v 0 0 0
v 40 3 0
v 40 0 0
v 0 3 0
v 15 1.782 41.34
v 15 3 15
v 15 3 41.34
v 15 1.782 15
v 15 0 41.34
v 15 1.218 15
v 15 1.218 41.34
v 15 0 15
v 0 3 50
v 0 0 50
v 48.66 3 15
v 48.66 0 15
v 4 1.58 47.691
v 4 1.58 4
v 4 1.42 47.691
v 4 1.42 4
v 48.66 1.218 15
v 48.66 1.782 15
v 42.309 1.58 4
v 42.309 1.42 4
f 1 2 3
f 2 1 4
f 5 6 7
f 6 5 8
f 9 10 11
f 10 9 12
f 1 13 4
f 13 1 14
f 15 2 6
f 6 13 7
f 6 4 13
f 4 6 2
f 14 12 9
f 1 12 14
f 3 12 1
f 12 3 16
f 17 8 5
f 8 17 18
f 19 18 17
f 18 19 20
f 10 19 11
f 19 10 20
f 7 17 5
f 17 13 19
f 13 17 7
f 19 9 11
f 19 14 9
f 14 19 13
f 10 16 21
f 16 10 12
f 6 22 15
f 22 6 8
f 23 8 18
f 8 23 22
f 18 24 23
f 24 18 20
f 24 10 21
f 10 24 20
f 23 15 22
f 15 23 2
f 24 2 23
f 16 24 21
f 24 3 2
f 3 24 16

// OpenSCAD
lenght = 50;

translate([0,0,lenght])rotate([0,90,0]) side(false);
side();


module side(left_corner = true){
    difference(){
        cube([lenght,3,15]);
        #
        translate([-5,3/2,16])
        rotate([-90,0,-90])
        linear_extrude(lenght+10)
        polygon([[-0.3,0],[0.3,0],[0.08,12],[-0.08,12]]);
        
        
        
        #rotate([0,-60,0]) cube([30,30,30]);
        if(left_corner){
            #translate([lenght-10,0,0]) rotate([0,30,0]) cube([30,30,30]);
        }
    }
}
